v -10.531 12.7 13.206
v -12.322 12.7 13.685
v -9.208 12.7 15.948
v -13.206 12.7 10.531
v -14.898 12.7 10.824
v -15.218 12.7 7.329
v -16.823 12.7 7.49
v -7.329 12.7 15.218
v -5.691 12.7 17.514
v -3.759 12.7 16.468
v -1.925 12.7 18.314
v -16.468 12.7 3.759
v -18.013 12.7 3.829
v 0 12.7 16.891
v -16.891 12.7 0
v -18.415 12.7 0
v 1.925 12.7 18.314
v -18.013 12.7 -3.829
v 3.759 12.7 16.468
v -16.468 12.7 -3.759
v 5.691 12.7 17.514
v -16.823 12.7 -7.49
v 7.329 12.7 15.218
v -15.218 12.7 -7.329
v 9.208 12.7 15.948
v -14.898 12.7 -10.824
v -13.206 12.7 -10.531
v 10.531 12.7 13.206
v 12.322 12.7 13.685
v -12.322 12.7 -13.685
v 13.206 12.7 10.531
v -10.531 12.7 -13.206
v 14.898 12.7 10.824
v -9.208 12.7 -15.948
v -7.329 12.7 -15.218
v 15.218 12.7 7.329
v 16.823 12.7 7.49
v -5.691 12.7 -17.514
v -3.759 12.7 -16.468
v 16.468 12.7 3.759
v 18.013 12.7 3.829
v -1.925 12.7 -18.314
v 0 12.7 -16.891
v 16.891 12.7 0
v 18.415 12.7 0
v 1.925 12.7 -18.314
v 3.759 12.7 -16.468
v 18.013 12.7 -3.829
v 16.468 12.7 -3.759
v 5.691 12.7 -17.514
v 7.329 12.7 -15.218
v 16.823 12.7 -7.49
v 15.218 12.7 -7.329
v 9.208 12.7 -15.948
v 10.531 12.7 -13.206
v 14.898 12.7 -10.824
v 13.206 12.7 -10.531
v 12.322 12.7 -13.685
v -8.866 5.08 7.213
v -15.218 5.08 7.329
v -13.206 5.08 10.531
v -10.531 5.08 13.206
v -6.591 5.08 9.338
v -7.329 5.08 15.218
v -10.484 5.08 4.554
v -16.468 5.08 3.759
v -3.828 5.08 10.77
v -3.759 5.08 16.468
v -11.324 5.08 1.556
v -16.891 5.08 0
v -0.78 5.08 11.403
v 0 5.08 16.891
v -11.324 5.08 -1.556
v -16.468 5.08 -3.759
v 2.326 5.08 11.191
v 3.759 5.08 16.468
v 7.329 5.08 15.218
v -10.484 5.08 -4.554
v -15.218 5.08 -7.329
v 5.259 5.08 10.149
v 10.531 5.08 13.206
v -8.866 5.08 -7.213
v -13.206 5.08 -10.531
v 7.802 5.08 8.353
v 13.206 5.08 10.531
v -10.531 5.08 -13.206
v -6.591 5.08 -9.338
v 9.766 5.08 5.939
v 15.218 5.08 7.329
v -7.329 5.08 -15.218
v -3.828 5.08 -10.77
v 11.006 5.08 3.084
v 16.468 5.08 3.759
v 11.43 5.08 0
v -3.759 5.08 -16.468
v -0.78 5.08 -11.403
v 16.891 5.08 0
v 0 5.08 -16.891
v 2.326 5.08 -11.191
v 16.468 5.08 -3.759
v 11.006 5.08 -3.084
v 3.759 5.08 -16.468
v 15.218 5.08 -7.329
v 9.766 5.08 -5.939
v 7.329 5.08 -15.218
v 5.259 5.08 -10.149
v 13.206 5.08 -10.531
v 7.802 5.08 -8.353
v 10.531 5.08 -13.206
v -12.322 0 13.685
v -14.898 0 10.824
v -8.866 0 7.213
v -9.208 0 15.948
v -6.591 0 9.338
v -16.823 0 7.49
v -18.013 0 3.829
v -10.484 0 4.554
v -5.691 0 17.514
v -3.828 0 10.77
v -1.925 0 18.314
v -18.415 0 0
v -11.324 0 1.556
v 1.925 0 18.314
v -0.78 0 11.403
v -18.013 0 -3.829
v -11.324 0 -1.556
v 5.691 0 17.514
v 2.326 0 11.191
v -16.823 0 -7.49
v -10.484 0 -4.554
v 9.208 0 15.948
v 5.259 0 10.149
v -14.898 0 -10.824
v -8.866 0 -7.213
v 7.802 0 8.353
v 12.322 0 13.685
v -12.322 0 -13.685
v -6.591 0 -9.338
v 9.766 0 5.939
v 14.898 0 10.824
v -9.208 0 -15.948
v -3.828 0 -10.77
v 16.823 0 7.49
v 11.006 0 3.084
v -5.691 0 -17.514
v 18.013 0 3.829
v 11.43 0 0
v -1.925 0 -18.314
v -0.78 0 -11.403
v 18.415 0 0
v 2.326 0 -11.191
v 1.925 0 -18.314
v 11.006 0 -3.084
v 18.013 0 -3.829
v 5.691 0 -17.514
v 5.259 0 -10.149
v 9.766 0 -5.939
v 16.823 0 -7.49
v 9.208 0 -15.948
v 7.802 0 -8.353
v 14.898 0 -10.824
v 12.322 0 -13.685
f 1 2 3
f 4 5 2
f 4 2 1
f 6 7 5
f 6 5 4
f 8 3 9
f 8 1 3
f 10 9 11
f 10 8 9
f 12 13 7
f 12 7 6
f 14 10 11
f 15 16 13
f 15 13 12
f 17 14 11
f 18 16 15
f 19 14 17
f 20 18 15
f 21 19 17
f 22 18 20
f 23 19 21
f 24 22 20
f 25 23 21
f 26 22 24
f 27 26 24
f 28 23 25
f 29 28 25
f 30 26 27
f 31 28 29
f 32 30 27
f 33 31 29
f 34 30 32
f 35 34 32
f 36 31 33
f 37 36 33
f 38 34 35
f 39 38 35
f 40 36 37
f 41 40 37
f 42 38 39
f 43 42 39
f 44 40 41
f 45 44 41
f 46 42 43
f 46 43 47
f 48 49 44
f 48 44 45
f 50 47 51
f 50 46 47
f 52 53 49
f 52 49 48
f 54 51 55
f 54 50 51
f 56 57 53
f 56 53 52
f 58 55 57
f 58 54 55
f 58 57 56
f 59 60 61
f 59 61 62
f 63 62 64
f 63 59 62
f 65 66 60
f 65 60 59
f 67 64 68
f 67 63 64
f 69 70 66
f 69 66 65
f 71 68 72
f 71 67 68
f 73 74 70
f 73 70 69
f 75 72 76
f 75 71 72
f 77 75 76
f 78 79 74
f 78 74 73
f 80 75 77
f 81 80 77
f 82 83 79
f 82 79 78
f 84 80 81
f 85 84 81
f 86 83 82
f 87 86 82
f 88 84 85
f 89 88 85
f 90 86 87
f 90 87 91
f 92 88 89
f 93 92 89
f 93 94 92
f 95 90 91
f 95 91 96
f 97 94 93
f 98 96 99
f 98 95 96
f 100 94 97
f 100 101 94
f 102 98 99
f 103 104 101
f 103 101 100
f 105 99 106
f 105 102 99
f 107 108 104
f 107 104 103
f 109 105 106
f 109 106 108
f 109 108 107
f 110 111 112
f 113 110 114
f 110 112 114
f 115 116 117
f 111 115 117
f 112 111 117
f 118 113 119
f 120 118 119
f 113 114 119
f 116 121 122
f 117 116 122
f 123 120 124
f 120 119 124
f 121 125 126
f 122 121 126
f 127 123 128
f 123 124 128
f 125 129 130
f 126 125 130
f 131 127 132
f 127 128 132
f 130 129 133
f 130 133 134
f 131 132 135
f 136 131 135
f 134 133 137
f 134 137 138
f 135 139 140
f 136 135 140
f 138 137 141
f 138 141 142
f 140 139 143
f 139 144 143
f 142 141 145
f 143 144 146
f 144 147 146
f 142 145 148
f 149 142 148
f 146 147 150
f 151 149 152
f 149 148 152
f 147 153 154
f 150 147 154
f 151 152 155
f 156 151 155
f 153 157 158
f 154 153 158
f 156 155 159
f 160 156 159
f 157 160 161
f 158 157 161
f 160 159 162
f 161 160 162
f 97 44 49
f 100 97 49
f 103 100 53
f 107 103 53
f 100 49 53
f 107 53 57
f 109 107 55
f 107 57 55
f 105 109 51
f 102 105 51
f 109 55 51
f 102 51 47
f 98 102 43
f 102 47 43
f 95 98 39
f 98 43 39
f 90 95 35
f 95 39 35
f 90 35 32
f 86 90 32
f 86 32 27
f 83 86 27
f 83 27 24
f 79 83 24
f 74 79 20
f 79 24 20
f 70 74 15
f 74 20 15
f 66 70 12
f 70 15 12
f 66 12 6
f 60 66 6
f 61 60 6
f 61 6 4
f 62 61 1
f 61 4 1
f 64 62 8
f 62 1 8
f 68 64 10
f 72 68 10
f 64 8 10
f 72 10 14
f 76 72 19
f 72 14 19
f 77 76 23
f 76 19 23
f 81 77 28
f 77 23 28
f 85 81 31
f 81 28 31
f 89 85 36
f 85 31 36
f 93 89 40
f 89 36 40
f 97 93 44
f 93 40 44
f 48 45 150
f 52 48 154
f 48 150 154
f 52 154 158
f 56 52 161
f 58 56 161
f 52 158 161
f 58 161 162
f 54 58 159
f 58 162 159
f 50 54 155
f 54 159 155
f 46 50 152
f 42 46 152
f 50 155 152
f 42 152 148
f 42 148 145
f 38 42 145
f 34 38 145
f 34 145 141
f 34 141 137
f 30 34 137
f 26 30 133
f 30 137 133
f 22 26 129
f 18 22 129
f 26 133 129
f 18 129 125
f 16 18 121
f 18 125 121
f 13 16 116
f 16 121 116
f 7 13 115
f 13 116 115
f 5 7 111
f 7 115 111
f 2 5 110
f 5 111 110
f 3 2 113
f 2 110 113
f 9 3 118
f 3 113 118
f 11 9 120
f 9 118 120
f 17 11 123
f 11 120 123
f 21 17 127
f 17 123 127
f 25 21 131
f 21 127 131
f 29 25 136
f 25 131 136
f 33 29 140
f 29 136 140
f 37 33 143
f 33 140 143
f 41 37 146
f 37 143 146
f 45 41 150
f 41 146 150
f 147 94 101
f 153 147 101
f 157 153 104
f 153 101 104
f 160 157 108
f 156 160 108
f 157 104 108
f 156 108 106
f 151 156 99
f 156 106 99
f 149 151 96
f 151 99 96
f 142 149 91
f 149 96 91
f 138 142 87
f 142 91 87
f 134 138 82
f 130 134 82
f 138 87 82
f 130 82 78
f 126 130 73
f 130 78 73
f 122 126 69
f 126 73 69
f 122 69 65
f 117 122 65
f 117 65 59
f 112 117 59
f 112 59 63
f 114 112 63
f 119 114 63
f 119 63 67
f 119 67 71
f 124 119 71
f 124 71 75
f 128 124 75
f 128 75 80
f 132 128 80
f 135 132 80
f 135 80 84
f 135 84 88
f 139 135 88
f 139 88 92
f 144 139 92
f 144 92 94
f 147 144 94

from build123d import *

# Parameters (mm, degrees)
SKETCH1_R               = 18.415
BOSS_EXTRUDE1_DEPTH     = 12.7
SKETCH2_R               = 16.891
CUT_EXTRUDE1_DEPTH      = 7.62
SKETCH3_R               = 11.43
CUT_EXTRUDE2_DEPTH      = 8.62
CUT_EXTRUDE2_DEPTH_BACK = 6.08


with BuildPart() as part:
    # Sketch1 → Boss-Extrude1 (new body)
    with BuildSketch(Plane(origin=(0, 0, 0), x_dir=(1, 0, 0), z_dir=(0, 1, 0))):
        Circle(SKETCH1_R)
    extrude(amount=BOSS_EXTRUDE1_DEPTH)

    # Sketch2 → Cut-Extrude1 (cut)
    with BuildSketch(Plane(origin=(0, 12.7, 0), x_dir=(1, 0, 0), z_dir=(0, 1, 0))):
        Circle(SKETCH2_R)
    extrude(amount=-CUT_EXTRUDE1_DEPTH, mode=Mode.SUBTRACT)

    # Sketch3 → Cut-Extrude2 (cut, two sides)
    with BuildSketch(Plane(origin=(0, 5.08, 0), x_dir=(1, 0, 0), z_dir=(0, 1, 0))) as cut_extrude2_sk:
        Circle(SKETCH3_R)
    extrude(amount=CUT_EXTRUDE2_DEPTH, mode=Mode.SUBTRACT)
    extrude(cut_extrude2_sk.sketch, amount=-CUT_EXTRUDE2_DEPTH_BACK, mode=Mode.SUBTRACT)


solid = part.part
